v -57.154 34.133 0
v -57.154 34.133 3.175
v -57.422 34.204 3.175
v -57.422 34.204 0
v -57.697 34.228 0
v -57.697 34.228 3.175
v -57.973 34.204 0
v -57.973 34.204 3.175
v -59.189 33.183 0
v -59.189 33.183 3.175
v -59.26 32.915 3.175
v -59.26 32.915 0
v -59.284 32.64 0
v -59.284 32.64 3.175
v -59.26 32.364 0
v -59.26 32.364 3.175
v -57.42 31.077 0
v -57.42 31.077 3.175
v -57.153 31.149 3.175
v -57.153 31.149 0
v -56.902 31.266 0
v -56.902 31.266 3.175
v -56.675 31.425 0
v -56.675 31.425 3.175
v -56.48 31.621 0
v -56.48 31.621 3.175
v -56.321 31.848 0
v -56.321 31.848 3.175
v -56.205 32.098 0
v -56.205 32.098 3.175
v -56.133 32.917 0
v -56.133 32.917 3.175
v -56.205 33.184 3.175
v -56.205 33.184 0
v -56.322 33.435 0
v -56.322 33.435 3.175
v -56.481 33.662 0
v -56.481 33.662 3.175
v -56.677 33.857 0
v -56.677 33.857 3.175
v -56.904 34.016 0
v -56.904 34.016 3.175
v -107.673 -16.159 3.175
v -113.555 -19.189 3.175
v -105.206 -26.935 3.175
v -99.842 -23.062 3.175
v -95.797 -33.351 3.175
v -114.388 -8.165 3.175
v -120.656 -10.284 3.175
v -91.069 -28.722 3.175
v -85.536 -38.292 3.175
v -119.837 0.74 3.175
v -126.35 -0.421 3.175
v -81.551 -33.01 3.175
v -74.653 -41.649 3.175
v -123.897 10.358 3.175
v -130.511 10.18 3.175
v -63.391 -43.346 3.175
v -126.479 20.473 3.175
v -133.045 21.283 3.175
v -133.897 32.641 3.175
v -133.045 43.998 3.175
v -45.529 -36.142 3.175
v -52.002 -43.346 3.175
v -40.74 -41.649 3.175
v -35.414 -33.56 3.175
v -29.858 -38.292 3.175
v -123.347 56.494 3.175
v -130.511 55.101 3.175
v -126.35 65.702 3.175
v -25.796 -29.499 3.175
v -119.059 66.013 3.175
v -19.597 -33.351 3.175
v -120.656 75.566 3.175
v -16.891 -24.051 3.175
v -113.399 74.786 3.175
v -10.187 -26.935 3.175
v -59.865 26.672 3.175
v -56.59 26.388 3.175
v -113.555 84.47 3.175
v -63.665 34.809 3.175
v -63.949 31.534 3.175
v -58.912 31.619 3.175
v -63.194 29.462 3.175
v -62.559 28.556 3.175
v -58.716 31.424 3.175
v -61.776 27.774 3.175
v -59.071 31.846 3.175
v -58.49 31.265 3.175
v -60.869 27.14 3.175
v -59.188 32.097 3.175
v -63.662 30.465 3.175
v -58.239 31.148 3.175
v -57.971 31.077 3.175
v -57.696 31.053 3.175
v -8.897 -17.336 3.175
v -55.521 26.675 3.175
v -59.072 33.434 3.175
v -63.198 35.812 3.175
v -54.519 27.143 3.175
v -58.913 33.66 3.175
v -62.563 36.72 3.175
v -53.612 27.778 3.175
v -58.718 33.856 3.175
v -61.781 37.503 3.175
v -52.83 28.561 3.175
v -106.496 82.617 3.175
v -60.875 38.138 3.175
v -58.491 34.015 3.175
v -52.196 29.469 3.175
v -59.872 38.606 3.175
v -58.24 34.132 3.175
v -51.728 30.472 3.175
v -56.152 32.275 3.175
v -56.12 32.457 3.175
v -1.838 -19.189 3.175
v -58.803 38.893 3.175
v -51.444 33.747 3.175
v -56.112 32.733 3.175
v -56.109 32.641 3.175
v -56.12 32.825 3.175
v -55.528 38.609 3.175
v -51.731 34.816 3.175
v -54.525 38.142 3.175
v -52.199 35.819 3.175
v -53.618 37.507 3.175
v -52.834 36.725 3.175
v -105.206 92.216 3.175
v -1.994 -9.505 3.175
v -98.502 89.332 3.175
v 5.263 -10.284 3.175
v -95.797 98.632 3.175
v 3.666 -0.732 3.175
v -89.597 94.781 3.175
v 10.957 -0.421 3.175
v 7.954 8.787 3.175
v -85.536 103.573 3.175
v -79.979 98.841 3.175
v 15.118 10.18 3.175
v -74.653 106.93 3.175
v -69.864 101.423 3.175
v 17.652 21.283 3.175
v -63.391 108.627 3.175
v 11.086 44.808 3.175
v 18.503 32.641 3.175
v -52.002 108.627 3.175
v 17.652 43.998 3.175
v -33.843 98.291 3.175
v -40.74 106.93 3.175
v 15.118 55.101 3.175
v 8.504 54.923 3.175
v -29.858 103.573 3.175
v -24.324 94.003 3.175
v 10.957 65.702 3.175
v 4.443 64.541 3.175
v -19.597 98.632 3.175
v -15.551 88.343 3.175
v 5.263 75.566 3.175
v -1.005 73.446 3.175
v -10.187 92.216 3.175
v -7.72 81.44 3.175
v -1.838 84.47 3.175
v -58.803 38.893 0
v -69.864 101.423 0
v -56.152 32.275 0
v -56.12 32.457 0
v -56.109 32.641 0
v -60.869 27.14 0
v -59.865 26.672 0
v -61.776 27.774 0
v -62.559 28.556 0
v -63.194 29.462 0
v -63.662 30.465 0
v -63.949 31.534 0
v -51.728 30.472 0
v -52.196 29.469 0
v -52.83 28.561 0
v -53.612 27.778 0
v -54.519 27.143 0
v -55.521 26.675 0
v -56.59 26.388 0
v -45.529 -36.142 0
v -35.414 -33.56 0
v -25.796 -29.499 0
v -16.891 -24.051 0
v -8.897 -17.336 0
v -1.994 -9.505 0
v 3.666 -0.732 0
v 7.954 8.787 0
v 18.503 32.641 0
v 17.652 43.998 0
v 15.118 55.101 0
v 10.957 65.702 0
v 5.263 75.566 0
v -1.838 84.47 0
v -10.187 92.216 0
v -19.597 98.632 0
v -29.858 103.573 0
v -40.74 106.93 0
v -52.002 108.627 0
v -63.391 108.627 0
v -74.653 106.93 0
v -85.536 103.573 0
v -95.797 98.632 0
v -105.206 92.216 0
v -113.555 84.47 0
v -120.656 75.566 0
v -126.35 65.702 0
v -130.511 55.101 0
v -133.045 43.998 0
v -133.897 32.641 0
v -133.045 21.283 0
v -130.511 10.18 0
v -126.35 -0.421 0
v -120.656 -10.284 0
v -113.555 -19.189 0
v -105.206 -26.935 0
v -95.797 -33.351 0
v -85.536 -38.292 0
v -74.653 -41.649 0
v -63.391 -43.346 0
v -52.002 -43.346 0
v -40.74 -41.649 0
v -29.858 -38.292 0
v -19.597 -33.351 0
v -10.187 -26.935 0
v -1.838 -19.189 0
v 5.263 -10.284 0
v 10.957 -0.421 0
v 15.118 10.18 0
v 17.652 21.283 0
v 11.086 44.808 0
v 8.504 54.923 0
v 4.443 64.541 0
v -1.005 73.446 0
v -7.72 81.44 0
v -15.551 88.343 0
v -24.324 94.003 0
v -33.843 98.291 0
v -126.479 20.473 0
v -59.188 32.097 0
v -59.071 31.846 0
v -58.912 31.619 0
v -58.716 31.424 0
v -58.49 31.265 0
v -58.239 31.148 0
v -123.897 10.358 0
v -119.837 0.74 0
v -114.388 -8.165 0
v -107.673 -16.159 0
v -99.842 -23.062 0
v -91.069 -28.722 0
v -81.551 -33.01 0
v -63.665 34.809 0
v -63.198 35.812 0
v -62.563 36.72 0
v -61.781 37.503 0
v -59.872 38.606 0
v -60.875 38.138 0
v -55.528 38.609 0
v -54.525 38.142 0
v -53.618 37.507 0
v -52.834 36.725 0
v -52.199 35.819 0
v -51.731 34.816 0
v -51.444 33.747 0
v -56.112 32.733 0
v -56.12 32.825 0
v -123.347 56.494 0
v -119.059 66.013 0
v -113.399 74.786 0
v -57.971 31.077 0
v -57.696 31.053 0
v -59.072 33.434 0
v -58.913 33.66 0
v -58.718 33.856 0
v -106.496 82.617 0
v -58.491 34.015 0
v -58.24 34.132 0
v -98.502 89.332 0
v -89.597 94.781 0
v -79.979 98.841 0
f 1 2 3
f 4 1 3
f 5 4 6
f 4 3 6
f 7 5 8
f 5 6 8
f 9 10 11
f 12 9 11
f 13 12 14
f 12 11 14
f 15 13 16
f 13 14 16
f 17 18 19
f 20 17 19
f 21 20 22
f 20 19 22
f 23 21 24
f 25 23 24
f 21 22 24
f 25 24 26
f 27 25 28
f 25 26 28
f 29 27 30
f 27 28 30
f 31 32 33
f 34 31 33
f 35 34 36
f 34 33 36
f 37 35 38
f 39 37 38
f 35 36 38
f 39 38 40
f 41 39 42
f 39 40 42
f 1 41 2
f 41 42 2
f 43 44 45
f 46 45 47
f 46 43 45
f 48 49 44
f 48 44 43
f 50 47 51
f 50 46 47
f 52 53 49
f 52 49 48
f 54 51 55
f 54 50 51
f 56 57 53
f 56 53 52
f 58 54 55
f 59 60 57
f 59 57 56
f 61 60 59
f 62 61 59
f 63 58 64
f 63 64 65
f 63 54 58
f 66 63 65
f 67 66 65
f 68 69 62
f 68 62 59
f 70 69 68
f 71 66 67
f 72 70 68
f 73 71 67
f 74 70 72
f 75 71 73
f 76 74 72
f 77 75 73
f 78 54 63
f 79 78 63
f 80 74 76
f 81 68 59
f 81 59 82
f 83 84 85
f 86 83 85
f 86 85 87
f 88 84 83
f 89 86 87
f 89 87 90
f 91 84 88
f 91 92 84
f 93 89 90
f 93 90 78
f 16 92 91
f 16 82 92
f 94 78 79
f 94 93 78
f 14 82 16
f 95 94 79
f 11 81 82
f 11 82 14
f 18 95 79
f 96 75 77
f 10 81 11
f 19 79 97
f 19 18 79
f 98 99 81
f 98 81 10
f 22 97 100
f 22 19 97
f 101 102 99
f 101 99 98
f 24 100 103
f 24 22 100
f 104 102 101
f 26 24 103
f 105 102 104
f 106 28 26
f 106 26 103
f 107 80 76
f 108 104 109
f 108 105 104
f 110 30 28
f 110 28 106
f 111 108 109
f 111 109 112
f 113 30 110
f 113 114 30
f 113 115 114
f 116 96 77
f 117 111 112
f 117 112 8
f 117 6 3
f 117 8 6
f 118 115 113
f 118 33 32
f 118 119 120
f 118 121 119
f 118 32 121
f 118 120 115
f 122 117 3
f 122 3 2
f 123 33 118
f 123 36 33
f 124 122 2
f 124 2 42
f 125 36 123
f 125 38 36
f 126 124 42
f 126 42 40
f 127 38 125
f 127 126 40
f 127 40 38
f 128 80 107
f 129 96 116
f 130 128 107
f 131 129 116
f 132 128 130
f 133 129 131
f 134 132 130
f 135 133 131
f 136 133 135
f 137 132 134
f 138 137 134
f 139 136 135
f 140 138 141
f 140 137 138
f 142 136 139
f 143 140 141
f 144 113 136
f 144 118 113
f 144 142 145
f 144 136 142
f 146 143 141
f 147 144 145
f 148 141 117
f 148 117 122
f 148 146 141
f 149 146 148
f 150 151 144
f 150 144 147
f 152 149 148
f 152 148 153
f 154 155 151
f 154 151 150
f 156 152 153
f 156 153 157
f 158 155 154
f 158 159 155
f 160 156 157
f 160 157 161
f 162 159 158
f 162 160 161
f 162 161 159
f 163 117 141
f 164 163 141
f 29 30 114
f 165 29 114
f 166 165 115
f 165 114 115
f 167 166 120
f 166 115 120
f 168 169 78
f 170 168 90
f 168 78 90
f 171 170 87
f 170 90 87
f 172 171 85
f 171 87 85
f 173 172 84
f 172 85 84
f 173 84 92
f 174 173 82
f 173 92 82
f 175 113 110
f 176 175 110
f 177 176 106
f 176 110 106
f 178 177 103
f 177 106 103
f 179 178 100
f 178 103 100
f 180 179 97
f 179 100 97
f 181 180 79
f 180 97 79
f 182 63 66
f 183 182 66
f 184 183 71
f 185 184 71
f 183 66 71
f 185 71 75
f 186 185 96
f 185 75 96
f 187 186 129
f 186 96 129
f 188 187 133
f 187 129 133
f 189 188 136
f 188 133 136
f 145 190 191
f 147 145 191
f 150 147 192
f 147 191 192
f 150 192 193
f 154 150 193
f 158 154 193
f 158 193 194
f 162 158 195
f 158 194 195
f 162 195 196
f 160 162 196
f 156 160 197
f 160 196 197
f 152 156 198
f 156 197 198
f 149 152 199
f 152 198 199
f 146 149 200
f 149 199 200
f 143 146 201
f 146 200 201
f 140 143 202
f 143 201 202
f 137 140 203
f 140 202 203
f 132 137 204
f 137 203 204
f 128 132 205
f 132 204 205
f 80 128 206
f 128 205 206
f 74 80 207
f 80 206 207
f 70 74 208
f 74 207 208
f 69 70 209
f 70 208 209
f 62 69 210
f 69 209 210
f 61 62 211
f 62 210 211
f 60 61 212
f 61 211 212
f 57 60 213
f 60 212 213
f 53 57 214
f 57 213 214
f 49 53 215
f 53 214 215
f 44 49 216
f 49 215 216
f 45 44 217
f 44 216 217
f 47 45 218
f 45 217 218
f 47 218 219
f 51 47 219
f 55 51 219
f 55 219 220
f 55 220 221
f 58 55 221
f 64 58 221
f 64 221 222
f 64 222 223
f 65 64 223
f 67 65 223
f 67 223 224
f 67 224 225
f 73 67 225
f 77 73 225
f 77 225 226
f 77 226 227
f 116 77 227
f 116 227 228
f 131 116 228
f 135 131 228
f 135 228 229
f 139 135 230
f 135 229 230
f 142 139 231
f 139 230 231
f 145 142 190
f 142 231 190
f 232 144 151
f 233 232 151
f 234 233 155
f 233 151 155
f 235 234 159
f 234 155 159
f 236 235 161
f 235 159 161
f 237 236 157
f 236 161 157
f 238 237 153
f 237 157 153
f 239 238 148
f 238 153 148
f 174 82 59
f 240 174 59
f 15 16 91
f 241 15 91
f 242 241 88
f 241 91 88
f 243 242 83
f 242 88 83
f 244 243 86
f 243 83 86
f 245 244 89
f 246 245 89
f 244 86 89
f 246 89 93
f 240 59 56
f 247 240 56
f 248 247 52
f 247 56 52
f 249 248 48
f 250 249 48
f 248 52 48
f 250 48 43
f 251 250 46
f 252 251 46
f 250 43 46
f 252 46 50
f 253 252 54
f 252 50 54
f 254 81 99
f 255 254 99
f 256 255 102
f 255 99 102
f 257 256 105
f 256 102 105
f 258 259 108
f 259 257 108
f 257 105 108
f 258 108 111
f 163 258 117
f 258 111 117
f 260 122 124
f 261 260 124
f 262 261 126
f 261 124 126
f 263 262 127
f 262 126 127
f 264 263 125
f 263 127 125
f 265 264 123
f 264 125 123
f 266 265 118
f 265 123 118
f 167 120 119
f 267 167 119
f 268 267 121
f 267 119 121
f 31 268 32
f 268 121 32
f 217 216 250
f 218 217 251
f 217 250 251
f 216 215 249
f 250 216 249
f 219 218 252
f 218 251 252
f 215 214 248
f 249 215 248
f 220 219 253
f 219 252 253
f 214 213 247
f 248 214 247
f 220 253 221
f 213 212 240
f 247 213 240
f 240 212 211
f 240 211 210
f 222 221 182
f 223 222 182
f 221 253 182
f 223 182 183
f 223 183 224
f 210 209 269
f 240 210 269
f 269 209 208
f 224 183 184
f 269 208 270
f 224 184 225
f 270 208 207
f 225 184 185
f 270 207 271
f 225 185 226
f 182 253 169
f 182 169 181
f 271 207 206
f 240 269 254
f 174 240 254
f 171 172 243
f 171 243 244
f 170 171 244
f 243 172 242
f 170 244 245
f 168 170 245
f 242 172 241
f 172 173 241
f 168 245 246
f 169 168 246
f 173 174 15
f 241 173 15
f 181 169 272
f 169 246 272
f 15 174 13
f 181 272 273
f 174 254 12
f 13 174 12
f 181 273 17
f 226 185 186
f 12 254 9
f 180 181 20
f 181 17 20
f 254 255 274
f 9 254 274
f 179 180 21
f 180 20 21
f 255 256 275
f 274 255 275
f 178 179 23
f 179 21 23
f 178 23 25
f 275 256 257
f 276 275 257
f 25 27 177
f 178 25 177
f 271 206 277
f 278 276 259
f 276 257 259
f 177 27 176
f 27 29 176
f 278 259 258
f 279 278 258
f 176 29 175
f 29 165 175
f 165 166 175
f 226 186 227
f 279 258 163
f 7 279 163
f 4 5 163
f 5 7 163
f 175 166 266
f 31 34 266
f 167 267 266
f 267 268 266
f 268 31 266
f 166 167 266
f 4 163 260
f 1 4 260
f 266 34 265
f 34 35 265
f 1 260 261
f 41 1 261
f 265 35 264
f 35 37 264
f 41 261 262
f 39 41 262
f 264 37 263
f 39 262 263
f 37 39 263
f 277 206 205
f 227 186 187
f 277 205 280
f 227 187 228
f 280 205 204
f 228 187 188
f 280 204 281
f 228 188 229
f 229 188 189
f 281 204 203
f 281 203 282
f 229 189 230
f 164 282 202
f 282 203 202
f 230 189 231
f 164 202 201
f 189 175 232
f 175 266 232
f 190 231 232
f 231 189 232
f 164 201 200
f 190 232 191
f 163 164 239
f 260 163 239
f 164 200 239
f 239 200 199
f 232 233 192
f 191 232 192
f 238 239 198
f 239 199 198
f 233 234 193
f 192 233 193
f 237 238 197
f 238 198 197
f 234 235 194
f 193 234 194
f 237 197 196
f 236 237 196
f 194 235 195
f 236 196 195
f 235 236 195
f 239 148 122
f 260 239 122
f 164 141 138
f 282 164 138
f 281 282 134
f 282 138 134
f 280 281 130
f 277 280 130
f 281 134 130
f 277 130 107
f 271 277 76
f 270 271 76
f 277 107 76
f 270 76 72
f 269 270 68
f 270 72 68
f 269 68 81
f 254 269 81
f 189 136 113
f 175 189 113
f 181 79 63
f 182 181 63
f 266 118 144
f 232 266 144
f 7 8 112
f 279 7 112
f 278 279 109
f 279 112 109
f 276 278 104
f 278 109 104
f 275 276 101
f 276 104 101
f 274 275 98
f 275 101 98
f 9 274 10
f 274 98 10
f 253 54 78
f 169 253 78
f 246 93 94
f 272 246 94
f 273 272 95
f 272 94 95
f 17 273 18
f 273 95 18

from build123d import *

# Parameters (mm, degrees)
F0_R     = 76.2
F1_DEPTH = 3.175
F3_DEPTH = 25.4
F4_DEPTH = 25.4


with BuildPart() as f1:
    # F0 (on Top) → F1 (new body)
    with BuildSketch(Plane.XY):
        with Locations((-57.6965734363, 32.640516758)):
            Circle(F0_R)
    extrude(amount=F1_DEPTH)

    # F2 (on face) → F3 (cut)
    with BuildSketch(Plane.XY.offset(3.175)):
        with BuildLine():
            ThreePointArc((-126.4787083378, 20.4733306254), (-111.1800565213, -12.2876429762), (-81.5505486037, -33.0101524596))
            Line((-81.5505486037, -33.0101524596), (-59.8651166333, 26.6722741018))
            ThreePointArc((-59.8651166333, 26.6722741018), (-62.5587082622, 28.5561386003), (-63.9494947909, 31.5344089277))
            Line((-63.9494947909, 31.5344089277), (-126.4787083378, 20.4733306254))
        make_face()
        with BuildLine():
            Line((-58.8026812665, 38.8934381127), (-69.8637595688, 101.4226516595))
            ThreePointArc((-69.8637595688, 101.4226516595), (-102.6247331704, 86.123999843), (-123.3472426538, 56.4944919254))
            Line((-123.3472426538, 56.4944919254), (-63.6648160924, 34.809059955))
            ThreePointArc((-63.6648160924, 34.809059955), (-61.7809515939, 37.5026515839), (-58.8026812665, 38.8934381127))
        make_face()
        with BuildLine():
            ThreePointArc((-45.5293873037, -36.1416181436), (-12.7684137021, -20.842966327), (7.9540957813, 8.7865415905))
            Line((7.9540957813, 8.7865415905), (-51.7283307801, 30.4719735609))
            ThreePointArc((-51.7283307801, 30.4719735609), (-53.6121952786, 27.7783819321), (-56.590465606, 26.3875954033))
            Line((-56.590465606, 26.3875954033), (-45.5293873037, -36.1416181436))
        make_face()
        with BuildLine():
            Line((-51.4436520816, 33.7466245882), (11.0855614653, 44.8077028905))
            ThreePointArc((11.0855614653, 44.8077028905), (-4.2130903513, 77.5686764921), (-33.8425982688, 98.2911859755))
            Line((-33.8425982688, 98.2911859755), (-55.5280302392, 38.6087594141))
            ThreePointArc((-55.5280302392, 38.6087594141), (-52.8344386104, 36.7248949156), (-51.4436520816, 33.7466245882))
        make_face()
    extrude(amount=-F3_DEPTH, mode=Mode.SUBTRACT)

    # F2 (on face) → F4 (cut)
    with BuildSketch(Plane.XY.offset(3.175)):
        with BuildLine():
            ThreePointArc((-57.4200464787, 31.0772864193), (-56.6754788968, 31.4249830515), (-56.2045127722, 32.0983809587))
            Line((-56.2045127722, 32.0983809587), (-57.6965734363, 32.640516758))
            Line((-57.6965734363, 32.640516758), (-57.4200464787, 31.0772864193))
        make_face()
        with BuildLine():
            ThreePointArc((-56.1090734363, 32.640516758), (-56.1151524909, 32.7793117279), (-56.1333430976, 32.9170437155))
            Line((-56.1333430976, 32.9170437155), (-57.6965734363, 32.640516758))
            Line((-57.6965734363, 32.640516758), (-56.2045127722, 32.0983809587))
            ThreePointArc((-56.2045127722, 32.0983809587), (-56.1331153214, 32.365280545), (-56.1090734363, 32.640516758))
        make_face()
        with BuildLine():
            Line((-57.6965734363, 32.640516758), (-56.1333430976, 32.9170437155))
            ThreePointArc((-56.1333430976, 32.9170437155), (-56.4810397298, 33.6616112974), (-57.154437637, 34.132577422))
            Line((-57.154437637, 34.132577422), (-57.6965734363, 32.640516758))
        make_face()
        with BuildLine():
            Line((-57.6965734363, 32.640516758), (-57.154437637, 34.132577422))
            ThreePointArc((-57.154437637, 34.132577422), (-57.5590841827, 34.2220517576), (-57.9731003938, 34.2037470966))
            Line((-57.9731003938, 34.2037470966), (-57.6965734363, 32.640516758))
        make_face()
        with BuildLine():
            Line((-59.1886341003, 33.1826525572), (-57.6965734363, 32.640516758))
            Line((-57.6965734363, 32.640516758), (-57.9731003938, 34.2037470966))
            ThreePointArc((-57.9731003938, 34.2037470966), (-58.7176679757, 33.8560504644), (-59.1886341003, 33.1826525572))
        make_face()
        with BuildLine():
            Line((-59.2598037749, 32.3639898004), (-57.6965734363, 32.640516758))
            Line((-57.6965734363, 32.640516758), (-59.1886341003, 33.1826525572))
            ThreePointArc((-59.1886341003, 33.1826525572), (-59.2781084359, 32.7780060115), (-59.2598037749, 32.3639898004))
        make_face()
        with BuildLine():
            Line((-58.2387092355, 31.1484560939), (-57.6965734363, 32.640516758))
            Line((-57.6965734363, 32.640516758), (-59.2598037749, 32.3639898004))
            ThreePointArc((-59.2598037749, 32.3639898004), (-58.9121071427, 31.6194222186), (-58.2387092355, 31.1484560939))
        make_face()
        with BuildLine():
            Line((-57.4200464787, 31.0772864193), (-57.6965734363, 32.640516758))
            Line((-57.6965734363, 32.640516758), (-58.2387092355, 31.1484560939))
            ThreePointArc((-58.2387092355, 31.1484560939), (-57.8340626898, 31.0589817583), (-57.4200464787, 31.0772864193))
        make_face()
    extrude(amount=-F4_DEPTH, mode=Mode.SUBTRACT)


solid = f1.part
